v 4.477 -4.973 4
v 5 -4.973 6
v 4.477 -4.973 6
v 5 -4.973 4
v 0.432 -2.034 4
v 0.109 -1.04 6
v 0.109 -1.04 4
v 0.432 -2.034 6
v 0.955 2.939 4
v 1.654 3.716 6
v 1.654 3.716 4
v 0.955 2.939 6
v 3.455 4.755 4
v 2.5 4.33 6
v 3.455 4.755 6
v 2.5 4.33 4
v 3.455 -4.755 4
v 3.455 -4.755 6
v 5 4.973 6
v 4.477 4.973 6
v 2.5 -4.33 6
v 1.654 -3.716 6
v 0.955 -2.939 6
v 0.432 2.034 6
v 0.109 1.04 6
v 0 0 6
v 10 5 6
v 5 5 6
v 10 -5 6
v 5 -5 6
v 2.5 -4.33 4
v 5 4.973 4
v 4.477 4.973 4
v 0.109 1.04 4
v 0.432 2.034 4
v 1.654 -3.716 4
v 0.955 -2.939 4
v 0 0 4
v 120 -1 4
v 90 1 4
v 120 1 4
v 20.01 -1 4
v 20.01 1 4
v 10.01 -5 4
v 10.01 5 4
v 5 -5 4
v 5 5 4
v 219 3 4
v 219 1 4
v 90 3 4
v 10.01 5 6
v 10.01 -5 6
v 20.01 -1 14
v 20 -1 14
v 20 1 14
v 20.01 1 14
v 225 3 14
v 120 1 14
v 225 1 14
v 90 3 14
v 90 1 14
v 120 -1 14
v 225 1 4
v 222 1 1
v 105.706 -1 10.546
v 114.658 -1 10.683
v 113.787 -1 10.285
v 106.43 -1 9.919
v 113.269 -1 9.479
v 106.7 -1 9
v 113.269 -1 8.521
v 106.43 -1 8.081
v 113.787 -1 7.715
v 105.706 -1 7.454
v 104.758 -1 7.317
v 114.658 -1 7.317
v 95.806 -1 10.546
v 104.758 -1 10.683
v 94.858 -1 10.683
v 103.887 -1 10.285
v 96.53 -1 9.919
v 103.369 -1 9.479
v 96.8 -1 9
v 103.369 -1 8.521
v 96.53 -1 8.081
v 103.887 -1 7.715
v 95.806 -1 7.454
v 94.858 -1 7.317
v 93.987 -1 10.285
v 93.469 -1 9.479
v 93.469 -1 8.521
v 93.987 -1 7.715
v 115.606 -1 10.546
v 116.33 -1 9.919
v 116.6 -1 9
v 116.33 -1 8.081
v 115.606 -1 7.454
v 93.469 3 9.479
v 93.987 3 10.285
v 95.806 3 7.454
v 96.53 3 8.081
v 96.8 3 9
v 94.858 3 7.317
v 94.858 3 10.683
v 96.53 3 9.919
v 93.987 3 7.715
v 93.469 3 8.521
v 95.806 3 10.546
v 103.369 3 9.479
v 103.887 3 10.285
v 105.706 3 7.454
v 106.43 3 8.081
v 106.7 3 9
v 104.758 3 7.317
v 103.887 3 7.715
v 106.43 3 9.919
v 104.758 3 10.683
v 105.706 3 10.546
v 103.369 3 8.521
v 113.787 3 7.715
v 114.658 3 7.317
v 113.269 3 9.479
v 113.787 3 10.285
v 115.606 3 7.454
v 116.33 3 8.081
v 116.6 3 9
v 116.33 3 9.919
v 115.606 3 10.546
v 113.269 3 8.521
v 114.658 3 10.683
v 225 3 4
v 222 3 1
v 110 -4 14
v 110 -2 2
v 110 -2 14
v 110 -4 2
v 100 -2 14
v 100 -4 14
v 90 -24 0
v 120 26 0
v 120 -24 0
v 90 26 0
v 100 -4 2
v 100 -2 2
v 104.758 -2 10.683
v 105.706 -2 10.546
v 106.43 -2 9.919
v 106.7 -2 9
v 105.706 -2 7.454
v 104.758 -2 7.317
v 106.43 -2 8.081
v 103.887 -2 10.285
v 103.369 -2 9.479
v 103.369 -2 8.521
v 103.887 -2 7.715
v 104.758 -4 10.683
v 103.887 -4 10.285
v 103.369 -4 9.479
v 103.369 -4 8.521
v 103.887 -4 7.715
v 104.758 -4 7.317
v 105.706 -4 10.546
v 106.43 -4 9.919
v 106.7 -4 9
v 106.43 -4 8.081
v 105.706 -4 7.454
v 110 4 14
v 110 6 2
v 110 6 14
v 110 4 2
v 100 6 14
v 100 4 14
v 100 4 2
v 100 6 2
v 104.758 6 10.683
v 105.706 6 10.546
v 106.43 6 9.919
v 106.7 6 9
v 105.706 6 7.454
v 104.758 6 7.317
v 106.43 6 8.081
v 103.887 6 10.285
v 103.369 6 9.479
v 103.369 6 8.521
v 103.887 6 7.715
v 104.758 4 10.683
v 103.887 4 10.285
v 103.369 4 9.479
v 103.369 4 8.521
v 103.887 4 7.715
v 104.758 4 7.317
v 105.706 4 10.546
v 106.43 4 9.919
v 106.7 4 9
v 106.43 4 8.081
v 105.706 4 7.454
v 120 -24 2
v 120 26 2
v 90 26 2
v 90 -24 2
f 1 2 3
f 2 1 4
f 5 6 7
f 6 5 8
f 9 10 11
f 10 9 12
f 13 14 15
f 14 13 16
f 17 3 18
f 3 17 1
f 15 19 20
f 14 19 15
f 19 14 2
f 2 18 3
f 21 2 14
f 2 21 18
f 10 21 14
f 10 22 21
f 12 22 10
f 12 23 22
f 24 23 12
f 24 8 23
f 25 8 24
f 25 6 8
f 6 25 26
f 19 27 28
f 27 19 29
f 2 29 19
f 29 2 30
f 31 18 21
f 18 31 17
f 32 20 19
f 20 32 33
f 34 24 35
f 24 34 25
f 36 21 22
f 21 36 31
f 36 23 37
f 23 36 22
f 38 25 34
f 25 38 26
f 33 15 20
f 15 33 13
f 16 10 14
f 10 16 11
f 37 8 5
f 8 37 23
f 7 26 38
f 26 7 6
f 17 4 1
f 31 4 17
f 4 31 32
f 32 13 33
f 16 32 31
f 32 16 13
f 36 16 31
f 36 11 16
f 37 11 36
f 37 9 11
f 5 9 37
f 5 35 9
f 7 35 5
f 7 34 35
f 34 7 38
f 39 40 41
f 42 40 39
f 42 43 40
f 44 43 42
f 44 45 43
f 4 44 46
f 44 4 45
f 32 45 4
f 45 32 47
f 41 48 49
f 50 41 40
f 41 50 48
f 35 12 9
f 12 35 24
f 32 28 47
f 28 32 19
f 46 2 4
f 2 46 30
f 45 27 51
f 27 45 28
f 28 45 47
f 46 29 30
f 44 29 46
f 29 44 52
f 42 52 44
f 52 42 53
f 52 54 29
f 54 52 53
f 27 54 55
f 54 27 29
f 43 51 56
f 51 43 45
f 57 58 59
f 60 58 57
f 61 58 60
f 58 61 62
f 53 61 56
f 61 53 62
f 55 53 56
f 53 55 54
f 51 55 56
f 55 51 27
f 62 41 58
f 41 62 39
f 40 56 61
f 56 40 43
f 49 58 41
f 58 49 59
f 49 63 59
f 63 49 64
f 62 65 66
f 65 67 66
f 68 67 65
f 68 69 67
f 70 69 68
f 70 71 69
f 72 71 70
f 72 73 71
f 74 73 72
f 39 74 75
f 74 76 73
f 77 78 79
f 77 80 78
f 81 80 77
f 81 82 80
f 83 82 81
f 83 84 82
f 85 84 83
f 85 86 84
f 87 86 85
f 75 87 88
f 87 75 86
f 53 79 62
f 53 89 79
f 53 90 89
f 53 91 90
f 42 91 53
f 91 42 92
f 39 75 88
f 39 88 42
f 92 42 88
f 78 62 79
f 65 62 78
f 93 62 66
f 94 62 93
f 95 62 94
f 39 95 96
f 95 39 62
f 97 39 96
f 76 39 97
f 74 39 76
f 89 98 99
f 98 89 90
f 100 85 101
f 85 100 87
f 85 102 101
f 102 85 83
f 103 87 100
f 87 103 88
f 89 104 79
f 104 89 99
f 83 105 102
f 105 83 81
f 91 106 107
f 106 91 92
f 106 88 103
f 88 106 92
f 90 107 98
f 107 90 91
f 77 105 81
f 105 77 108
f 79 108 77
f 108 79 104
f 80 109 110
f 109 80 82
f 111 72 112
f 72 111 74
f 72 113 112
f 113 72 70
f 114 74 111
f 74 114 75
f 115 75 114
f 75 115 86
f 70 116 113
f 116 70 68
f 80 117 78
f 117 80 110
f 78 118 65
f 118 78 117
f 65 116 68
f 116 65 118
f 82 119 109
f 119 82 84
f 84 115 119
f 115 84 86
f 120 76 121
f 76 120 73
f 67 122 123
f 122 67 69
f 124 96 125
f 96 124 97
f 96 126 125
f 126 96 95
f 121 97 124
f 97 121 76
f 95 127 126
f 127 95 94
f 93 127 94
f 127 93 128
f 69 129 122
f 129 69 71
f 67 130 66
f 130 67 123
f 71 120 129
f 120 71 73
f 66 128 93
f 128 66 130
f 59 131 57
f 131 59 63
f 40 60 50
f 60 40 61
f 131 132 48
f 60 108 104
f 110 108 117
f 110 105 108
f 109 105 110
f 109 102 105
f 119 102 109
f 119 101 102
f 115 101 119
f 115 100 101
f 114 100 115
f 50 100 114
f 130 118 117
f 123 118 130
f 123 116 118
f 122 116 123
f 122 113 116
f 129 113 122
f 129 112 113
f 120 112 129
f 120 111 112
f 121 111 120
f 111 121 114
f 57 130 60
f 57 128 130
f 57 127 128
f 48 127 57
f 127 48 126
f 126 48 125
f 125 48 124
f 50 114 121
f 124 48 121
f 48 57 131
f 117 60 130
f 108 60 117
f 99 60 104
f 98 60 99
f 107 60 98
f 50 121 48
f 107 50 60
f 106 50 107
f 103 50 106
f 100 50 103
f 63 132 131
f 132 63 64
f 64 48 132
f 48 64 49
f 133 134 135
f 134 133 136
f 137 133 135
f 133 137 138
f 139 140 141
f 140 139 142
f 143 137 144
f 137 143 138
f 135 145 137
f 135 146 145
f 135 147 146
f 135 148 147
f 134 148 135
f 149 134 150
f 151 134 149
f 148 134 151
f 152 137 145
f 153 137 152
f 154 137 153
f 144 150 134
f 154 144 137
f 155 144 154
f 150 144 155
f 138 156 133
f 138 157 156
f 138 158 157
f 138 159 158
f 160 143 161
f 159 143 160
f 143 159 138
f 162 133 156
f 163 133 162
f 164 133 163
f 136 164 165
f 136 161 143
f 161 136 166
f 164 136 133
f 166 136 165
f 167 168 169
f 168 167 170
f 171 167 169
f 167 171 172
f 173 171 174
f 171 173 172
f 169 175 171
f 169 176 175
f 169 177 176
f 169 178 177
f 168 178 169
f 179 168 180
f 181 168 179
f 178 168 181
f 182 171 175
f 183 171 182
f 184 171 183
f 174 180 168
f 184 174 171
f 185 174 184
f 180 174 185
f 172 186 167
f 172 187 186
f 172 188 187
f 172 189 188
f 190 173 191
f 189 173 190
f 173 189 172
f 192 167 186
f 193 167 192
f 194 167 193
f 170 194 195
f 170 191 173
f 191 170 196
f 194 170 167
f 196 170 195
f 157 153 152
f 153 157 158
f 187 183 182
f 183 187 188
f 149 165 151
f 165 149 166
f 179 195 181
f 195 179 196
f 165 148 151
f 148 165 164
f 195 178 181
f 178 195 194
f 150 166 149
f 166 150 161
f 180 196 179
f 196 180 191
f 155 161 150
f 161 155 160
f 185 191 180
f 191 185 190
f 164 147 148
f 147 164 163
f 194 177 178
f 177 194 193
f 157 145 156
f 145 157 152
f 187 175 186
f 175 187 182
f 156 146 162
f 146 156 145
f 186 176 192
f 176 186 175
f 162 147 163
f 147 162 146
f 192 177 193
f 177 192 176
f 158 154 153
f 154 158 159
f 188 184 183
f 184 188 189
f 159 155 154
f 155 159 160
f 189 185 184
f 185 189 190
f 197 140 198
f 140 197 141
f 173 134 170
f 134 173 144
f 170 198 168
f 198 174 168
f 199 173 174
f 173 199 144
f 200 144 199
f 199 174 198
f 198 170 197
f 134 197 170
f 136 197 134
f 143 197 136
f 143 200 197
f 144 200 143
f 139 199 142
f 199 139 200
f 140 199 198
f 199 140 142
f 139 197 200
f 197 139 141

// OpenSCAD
// Use partname to control which object is being rendered:
//
// _partname_values outer_arm inner_arm hinge
partname = "display";

arm_height = 10;
arm_thickness = 2;

// full length roughly 225, and 20 are added for overlap, divided thus:
arm_hinge_overlap = 30;
outer_arm_length = 105+arm_hinge_overlap/2;
inner_arm_length = 120+arm_hinge_overlap/2;

inner_arm_button_presser_depth = 3;

outer_arm_finger_area_inset = 20;
outer_arm_finger_area_width = 10;


// how much off plane level should the hinge lift the arm?
hinge_lift = 4;
hinge_length = 10;
hinge_base_length = 30;
hinge_width = 50;
hinge_arm_spacing = 3*arm_thickness;

m3_bolt_cutout_r = 1.7;

// $fa is the minimum angle for a fragment. Minimum value is 0.01.
$fa = 12;
// $fs is the minimum size of a fragment. If high, causes
// fewer-than-$fa-would-indicate surfaces. Minimum is 0.01.
$fs = 1;

// internal:
//drillpoints = [1*arm_hinge_overlap/4,2*arm_hinge_overlap/4,3*arm_hinge_overlap/4];
drillpoints = [
  min(0.25*arm_hinge_overlap,3*m3_bolt_cutout_r),
  0.5*arm_hinge_overlap,
  max(0.75*arm_hinge_overlap,arm_hinge_overlap-3*m3_bolt_cutout_r),
];

module outer_arm()
{
  difference()
  {
    union()
    {
      // the finger area:
      translate([outer_arm_finger_area_width/2,0,0])
        cylinder(r=outer_arm_finger_area_width/2, h=arm_thickness);


      // hull()-based extension from finger area to arm:
      // first, a flat boxy piece:
      translate([outer_arm_finger_area_width/2,-outer_arm_finger_area_width/2,0])
        cube([outer_arm_finger_area_width/2,outer_arm_finger_area_width,arm_thickness]);
      hull()
      {
        translate([outer_arm_finger_area_width,-outer_arm_finger_area_width/2,0])
          cube([0.01,outer_arm_finger_area_width,arm_thickness]);
        translate([outer_arm_finger_area_inset,-arm_thickness/2,0])
          cube([0.01,arm_thickness,arm_height]);
      }

      // the arm itself
      translate([outer_arm_finger_area_inset,-arm_thickness/2,0])
        cube([outer_arm_length-outer_arm_finger_area_inset,arm_thickness,arm_height]);

      /* translate([outer_arm_finger_area_width/2,-outer_arm_finger_area_width/2,0]) */
      /*   cube([outer_arm_finger_area_inset-outer_arm_finger_area_width/2+20,outer_arm_finger_area_width,arm_thickness]); */

      /* // the arm itself */
      /* translate([outer_arm_finger_area_inset,-arm_thickness/2,0]) */
      /*   cube([outer_arm_length-outer_arm_finger_area_inset,arm_thickness,arm_height]); */
    }

    translate([outer_arm_length-arm_hinge_overlap,-arm_thickness/2,0])
    {
      for (xoff = drillpoints)
        translate([xoff,0,arm_height/2])
          rotate([-90,0,0])
            translate([0,0,-arm_thickness])
              cylinder(r=m3_bolt_cutout_r,h=3*arm_thickness);
    }
  }
}
module inner_arm()
{
  difference()
  {
    union ()
    {
      translate([0,-arm_thickness/2,0])
        cube([inner_arm_length,arm_thickness,arm_height]);
      translate([inner_arm_length,-arm_thickness/2,0])
        rotate([0,180+45,0])
          cube ([inner_arm_button_presser_depth/cos(45), arm_thickness,inner_arm_button_presser_depth/cos(45)]);
    }
    translate([0,-arm_thickness/2,0])
    {
      for (xoff = drillpoints)
        translate([xoff,0,arm_height/2])
          rotate([-90,0,0])
            translate([0,0,-arm_thickness])
              cylinder(r=m3_bolt_cutout_r,h=3*arm_thickness);
    }
  }
}
module hinge()
{
  translate([-(hinge_base_length-hinge_length)/2,0,0])
    cube([hinge_base_length,hinge_width,arm_thickness]);

  // the hinge rotation points
  difference ()
  {
    union ()
    {
      for (yoff = [
        hinge_width/2-(hinge_arm_spacing+2*0.5*arm_thickness)/2,
        hinge_width/2+(hinge_arm_spacing+2*0.5*arm_thickness)/2
      ])
        translate([0,yoff-0.5*arm_thickness,0])
          cube([hinge_length,arm_thickness,hinge_lift+arm_height]);
    }
    translate([hinge_length/2,0,hinge_lift+arm_height/2])
      rotate([-90,0,0])
        cylinder(r=m3_bolt_cutout_r,h=hinge_width);
    }
}


// Conventions:
// * When an object is rendered using partname, position/rotate it according to
//   printing suggestion, here. (The module itself will be positioned/rotated
//   like it will be, in the put-together "display" situation.)
// * The special value "display" for partname is the product picture for all
//   parts put together.
if ("display" == partname) {
  translate([0,0,hinge_lift])
    outer_arm();
  translate([outer_arm_length-arm_hinge_overlap,arm_thickness,hinge_lift])
    inner_arm();
  translate([
    outer_arm_length-arm_hinge_overlap/2-(hinge_length/2),
    -(hinge_width/2-0.5*arm_thickness),
    0
  ]) {
    hinge();
  }
} else if ("outer_arm" == partname) {
  outer_arm();
} else if ("inner_arm" == partname) {
  rotate([90,0,0])
  {
    inner_arm();
  }
} else if ("hinge" == partname) {
  hinge();
}
